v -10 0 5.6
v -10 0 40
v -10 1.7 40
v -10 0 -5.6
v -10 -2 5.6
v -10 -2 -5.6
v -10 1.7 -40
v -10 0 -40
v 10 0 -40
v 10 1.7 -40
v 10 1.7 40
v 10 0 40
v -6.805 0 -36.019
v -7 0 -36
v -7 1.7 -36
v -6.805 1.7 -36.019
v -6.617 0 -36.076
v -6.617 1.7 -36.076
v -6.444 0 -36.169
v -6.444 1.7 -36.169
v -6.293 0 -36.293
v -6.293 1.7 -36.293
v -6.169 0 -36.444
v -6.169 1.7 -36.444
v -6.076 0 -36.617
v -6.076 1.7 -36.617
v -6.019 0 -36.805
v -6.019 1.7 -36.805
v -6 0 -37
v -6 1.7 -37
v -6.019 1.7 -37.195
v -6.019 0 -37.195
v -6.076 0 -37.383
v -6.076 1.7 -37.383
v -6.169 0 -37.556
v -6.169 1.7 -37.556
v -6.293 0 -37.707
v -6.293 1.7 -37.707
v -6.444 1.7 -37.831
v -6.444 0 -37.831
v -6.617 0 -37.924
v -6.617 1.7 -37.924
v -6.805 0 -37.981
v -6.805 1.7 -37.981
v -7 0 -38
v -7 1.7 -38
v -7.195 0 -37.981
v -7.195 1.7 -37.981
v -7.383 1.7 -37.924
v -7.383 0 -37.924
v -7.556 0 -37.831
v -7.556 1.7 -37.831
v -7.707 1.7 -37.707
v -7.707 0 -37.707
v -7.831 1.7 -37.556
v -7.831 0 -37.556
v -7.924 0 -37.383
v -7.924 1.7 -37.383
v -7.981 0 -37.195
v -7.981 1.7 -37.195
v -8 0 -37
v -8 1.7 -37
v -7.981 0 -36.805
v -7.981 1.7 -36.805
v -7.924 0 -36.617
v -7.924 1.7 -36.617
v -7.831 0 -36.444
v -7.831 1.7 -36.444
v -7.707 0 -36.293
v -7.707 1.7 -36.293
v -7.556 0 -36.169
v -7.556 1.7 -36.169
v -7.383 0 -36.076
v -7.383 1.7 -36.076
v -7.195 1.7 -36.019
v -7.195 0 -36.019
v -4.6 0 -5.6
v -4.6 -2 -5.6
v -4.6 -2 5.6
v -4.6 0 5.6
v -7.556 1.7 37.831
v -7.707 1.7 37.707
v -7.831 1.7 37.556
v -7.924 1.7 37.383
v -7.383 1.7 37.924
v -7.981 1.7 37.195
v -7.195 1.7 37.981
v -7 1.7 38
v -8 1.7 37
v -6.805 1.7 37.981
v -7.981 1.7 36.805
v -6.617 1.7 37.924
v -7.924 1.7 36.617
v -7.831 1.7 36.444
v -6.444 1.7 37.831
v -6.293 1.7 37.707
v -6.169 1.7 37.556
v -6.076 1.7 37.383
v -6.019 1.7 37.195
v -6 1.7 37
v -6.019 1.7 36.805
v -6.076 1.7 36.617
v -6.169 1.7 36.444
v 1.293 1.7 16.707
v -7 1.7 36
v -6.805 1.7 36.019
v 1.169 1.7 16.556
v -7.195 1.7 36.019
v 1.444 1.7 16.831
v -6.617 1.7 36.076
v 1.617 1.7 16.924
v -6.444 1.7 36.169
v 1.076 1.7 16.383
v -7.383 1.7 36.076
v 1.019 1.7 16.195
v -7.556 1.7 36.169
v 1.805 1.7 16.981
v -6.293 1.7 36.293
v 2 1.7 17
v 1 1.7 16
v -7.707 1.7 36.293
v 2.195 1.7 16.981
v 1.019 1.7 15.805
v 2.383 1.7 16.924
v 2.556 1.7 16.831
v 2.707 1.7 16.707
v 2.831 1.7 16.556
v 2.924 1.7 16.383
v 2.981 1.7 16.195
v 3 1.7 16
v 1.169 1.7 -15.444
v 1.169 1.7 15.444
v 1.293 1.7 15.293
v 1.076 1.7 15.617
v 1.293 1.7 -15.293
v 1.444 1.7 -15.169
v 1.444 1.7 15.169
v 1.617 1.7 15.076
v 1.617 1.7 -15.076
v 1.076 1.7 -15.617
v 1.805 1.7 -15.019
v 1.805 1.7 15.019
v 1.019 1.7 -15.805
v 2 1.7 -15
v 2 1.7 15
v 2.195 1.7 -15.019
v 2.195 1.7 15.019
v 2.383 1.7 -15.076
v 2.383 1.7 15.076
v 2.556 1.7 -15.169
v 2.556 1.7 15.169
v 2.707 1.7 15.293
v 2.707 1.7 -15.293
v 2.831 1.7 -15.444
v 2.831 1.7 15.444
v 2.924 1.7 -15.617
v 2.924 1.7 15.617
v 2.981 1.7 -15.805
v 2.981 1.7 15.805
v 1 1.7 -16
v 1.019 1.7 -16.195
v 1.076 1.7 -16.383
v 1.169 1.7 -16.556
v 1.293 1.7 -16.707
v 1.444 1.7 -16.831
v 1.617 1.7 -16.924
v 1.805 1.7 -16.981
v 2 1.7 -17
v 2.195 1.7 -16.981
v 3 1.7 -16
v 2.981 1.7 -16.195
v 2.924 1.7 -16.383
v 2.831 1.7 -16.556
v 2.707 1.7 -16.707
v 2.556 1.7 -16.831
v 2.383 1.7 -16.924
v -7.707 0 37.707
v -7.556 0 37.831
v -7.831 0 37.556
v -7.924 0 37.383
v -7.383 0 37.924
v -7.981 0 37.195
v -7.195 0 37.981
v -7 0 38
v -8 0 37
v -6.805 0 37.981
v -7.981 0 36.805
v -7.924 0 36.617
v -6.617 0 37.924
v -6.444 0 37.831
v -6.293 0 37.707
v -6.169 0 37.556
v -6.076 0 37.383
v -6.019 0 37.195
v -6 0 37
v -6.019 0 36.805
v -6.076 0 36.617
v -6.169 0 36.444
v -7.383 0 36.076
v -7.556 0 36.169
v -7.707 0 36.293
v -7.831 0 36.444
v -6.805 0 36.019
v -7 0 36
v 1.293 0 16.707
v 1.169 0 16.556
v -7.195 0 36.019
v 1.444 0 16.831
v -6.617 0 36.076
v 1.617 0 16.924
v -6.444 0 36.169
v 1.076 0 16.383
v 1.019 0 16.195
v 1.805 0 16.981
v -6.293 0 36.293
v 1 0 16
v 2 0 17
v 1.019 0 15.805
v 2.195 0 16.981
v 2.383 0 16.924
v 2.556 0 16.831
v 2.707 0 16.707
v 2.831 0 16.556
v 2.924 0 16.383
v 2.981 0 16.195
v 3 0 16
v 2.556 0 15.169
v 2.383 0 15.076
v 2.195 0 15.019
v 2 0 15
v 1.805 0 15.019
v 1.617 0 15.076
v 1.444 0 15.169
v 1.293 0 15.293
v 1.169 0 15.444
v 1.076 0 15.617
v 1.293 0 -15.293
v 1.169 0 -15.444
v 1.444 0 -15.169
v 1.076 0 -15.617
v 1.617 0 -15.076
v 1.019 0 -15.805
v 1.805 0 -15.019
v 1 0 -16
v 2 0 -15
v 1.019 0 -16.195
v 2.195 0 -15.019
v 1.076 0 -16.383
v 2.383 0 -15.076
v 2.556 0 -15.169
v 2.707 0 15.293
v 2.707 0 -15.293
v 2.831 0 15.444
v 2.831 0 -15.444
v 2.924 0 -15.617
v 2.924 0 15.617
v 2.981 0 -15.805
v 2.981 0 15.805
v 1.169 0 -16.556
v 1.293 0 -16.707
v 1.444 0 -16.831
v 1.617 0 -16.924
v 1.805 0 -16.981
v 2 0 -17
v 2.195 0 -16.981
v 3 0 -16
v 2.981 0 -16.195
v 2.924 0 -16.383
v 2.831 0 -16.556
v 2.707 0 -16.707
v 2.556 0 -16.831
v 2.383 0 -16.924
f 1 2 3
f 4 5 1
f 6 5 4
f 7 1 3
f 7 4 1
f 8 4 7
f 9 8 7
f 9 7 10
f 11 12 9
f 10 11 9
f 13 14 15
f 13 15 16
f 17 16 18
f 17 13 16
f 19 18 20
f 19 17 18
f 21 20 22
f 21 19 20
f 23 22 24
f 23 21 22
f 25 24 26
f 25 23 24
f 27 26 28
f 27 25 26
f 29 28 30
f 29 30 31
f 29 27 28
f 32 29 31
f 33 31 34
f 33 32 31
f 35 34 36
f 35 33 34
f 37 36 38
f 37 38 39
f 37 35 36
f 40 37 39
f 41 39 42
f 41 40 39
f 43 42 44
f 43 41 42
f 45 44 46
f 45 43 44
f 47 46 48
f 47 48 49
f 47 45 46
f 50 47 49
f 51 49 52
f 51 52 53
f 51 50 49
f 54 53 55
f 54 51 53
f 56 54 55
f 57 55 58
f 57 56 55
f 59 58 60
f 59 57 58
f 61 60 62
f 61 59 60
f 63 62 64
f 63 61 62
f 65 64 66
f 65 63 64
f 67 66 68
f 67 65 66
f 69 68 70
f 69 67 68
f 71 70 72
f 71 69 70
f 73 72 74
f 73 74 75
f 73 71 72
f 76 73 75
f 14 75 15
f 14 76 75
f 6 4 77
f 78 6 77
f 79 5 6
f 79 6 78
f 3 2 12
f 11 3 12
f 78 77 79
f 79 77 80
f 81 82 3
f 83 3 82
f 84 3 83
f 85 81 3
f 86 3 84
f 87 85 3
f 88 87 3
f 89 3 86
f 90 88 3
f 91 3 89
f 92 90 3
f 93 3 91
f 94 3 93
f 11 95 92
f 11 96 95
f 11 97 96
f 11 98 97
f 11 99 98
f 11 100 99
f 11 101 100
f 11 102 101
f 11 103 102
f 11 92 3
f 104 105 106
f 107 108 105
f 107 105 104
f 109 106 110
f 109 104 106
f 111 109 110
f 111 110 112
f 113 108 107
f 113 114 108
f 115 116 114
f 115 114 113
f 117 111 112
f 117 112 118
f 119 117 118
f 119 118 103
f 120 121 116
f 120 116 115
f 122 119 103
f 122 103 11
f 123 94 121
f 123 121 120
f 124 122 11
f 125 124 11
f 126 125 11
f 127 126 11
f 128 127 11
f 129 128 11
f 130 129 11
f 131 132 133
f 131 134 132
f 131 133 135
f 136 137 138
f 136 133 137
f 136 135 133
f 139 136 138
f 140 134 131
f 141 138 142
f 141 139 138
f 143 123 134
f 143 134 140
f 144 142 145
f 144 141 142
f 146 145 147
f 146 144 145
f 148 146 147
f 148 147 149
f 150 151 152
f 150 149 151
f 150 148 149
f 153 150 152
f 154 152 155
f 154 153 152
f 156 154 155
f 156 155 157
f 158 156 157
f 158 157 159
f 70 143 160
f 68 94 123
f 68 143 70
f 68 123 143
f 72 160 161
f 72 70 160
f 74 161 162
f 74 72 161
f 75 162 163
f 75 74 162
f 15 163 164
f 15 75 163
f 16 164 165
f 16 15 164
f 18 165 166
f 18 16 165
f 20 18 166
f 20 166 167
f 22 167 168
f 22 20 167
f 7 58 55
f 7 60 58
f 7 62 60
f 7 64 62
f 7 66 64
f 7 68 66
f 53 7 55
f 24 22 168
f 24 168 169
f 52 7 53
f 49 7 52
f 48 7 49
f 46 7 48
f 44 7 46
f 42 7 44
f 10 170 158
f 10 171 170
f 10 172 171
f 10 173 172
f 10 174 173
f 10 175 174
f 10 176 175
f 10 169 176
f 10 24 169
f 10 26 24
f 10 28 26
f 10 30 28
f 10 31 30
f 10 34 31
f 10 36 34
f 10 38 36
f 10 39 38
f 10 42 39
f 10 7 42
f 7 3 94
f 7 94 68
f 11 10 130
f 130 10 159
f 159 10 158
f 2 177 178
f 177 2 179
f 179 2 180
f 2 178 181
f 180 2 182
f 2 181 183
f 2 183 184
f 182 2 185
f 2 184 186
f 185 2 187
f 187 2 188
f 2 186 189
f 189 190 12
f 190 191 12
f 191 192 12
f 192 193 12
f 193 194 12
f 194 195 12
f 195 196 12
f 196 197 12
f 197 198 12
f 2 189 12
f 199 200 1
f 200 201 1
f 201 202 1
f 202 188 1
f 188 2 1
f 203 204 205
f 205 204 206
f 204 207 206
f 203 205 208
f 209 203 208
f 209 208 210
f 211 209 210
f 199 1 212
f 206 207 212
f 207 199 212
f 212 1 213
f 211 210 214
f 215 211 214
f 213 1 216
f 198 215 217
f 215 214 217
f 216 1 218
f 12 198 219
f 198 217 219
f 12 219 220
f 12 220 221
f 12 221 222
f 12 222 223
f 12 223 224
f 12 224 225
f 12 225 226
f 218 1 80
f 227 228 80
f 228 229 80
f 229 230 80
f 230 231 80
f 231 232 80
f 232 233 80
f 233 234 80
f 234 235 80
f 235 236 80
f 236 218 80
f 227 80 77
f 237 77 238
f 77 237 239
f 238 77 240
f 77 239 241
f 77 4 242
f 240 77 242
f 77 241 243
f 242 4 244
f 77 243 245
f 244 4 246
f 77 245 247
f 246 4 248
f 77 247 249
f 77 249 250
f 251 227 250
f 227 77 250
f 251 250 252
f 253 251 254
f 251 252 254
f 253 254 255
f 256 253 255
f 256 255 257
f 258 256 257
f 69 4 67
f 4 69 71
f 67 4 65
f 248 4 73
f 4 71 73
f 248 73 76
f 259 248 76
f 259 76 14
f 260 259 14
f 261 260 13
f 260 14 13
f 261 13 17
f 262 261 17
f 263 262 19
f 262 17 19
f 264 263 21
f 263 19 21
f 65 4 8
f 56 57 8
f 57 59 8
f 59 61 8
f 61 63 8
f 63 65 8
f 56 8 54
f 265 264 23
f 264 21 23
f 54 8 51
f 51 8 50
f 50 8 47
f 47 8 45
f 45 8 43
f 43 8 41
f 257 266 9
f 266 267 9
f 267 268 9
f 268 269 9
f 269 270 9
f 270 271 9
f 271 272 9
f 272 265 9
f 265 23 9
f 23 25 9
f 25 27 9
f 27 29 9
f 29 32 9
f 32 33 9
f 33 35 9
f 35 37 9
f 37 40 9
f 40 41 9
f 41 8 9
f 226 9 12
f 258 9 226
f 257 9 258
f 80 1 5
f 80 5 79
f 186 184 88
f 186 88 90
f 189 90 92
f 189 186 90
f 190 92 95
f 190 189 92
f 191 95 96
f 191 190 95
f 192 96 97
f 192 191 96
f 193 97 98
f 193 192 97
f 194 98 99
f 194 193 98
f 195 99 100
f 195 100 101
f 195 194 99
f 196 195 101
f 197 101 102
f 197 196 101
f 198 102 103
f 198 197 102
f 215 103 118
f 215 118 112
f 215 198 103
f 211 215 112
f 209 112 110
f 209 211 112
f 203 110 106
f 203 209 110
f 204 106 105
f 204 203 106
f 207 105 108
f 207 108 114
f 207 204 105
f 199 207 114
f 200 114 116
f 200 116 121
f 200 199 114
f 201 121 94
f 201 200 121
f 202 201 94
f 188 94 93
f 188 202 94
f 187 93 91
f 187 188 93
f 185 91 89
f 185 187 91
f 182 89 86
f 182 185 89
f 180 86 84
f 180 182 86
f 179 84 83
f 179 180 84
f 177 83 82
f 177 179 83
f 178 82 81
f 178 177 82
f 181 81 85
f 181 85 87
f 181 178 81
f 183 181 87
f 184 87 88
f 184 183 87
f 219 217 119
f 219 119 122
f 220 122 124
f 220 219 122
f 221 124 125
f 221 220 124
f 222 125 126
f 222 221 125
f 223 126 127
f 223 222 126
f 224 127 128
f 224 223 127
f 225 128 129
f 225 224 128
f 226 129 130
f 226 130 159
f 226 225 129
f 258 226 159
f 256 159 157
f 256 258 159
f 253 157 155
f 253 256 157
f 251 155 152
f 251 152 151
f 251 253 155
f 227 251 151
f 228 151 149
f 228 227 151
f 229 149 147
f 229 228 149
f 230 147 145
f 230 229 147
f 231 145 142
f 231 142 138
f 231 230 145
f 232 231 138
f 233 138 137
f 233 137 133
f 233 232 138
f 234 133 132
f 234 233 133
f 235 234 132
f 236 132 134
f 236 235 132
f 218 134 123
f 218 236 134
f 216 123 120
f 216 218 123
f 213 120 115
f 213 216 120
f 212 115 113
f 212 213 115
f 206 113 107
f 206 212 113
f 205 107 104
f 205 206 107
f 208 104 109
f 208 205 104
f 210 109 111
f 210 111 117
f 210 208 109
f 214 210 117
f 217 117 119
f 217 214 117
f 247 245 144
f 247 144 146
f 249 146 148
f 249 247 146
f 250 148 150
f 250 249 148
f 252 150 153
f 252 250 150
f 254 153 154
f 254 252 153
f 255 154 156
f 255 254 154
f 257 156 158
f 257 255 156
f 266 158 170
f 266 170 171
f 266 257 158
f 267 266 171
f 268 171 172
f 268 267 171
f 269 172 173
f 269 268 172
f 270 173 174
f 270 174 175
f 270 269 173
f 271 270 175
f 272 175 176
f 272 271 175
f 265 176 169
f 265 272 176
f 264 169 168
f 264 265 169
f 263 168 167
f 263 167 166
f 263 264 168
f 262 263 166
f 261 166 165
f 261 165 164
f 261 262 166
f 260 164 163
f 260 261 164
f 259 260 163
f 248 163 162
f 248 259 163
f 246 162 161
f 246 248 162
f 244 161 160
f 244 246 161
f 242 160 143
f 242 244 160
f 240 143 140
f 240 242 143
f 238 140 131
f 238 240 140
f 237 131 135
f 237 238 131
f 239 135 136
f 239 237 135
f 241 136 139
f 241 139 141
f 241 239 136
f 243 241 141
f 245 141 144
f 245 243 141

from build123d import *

# Parameters (mm, degrees)
SKETCH_1_W      = 20
SKETCH_1_H      = 80
SKETCH_1_R      = 1
EXTRUDE_1_DEPTH = 1.7
SKETCH_3_W      = 5.4
SKETCH_3_H      = 11.2
EXTRUDE_2_DEPTH = 2


with BuildPart() as part:
    # 草图1 → 凸台-拉伸1 (new body)
    with BuildSketch(Plane(origin=(0, 0, 0), x_dir=(1, 0, 0), z_dir=(0, 1, 0))):
        Rectangle(SKETCH_1_W, SKETCH_1_H)
        with Locations(Location((2, 16, 0), (0, 0, 270))):
            Circle(SKETCH_1_R, mode=Mode.SUBTRACT)
        with Locations(Location((2, -16, 0), (0, 0, 270))):
            Circle(SKETCH_1_R, mode=Mode.SUBTRACT)
        with Locations(Location((-7, 37, 0), (0, 0, 270))):
            Circle(SKETCH_1_R, mode=Mode.SUBTRACT)
        with Locations(Location((-7, -37, 0), (0, 0, 270))):
            Circle(SKETCH_1_R, mode=Mode.SUBTRACT)
    extrude(amount=EXTRUDE_1_DEPTH)

    # 草图3 → 凸台-拉伸2 (add)
    with BuildSketch(Plane.XZ):
        with Locations((-7.3, 0)):
            Rectangle(SKETCH_3_W, SKETCH_3_H)
    extrude(amount=EXTRUDE_2_DEPTH)


solid = part.part
